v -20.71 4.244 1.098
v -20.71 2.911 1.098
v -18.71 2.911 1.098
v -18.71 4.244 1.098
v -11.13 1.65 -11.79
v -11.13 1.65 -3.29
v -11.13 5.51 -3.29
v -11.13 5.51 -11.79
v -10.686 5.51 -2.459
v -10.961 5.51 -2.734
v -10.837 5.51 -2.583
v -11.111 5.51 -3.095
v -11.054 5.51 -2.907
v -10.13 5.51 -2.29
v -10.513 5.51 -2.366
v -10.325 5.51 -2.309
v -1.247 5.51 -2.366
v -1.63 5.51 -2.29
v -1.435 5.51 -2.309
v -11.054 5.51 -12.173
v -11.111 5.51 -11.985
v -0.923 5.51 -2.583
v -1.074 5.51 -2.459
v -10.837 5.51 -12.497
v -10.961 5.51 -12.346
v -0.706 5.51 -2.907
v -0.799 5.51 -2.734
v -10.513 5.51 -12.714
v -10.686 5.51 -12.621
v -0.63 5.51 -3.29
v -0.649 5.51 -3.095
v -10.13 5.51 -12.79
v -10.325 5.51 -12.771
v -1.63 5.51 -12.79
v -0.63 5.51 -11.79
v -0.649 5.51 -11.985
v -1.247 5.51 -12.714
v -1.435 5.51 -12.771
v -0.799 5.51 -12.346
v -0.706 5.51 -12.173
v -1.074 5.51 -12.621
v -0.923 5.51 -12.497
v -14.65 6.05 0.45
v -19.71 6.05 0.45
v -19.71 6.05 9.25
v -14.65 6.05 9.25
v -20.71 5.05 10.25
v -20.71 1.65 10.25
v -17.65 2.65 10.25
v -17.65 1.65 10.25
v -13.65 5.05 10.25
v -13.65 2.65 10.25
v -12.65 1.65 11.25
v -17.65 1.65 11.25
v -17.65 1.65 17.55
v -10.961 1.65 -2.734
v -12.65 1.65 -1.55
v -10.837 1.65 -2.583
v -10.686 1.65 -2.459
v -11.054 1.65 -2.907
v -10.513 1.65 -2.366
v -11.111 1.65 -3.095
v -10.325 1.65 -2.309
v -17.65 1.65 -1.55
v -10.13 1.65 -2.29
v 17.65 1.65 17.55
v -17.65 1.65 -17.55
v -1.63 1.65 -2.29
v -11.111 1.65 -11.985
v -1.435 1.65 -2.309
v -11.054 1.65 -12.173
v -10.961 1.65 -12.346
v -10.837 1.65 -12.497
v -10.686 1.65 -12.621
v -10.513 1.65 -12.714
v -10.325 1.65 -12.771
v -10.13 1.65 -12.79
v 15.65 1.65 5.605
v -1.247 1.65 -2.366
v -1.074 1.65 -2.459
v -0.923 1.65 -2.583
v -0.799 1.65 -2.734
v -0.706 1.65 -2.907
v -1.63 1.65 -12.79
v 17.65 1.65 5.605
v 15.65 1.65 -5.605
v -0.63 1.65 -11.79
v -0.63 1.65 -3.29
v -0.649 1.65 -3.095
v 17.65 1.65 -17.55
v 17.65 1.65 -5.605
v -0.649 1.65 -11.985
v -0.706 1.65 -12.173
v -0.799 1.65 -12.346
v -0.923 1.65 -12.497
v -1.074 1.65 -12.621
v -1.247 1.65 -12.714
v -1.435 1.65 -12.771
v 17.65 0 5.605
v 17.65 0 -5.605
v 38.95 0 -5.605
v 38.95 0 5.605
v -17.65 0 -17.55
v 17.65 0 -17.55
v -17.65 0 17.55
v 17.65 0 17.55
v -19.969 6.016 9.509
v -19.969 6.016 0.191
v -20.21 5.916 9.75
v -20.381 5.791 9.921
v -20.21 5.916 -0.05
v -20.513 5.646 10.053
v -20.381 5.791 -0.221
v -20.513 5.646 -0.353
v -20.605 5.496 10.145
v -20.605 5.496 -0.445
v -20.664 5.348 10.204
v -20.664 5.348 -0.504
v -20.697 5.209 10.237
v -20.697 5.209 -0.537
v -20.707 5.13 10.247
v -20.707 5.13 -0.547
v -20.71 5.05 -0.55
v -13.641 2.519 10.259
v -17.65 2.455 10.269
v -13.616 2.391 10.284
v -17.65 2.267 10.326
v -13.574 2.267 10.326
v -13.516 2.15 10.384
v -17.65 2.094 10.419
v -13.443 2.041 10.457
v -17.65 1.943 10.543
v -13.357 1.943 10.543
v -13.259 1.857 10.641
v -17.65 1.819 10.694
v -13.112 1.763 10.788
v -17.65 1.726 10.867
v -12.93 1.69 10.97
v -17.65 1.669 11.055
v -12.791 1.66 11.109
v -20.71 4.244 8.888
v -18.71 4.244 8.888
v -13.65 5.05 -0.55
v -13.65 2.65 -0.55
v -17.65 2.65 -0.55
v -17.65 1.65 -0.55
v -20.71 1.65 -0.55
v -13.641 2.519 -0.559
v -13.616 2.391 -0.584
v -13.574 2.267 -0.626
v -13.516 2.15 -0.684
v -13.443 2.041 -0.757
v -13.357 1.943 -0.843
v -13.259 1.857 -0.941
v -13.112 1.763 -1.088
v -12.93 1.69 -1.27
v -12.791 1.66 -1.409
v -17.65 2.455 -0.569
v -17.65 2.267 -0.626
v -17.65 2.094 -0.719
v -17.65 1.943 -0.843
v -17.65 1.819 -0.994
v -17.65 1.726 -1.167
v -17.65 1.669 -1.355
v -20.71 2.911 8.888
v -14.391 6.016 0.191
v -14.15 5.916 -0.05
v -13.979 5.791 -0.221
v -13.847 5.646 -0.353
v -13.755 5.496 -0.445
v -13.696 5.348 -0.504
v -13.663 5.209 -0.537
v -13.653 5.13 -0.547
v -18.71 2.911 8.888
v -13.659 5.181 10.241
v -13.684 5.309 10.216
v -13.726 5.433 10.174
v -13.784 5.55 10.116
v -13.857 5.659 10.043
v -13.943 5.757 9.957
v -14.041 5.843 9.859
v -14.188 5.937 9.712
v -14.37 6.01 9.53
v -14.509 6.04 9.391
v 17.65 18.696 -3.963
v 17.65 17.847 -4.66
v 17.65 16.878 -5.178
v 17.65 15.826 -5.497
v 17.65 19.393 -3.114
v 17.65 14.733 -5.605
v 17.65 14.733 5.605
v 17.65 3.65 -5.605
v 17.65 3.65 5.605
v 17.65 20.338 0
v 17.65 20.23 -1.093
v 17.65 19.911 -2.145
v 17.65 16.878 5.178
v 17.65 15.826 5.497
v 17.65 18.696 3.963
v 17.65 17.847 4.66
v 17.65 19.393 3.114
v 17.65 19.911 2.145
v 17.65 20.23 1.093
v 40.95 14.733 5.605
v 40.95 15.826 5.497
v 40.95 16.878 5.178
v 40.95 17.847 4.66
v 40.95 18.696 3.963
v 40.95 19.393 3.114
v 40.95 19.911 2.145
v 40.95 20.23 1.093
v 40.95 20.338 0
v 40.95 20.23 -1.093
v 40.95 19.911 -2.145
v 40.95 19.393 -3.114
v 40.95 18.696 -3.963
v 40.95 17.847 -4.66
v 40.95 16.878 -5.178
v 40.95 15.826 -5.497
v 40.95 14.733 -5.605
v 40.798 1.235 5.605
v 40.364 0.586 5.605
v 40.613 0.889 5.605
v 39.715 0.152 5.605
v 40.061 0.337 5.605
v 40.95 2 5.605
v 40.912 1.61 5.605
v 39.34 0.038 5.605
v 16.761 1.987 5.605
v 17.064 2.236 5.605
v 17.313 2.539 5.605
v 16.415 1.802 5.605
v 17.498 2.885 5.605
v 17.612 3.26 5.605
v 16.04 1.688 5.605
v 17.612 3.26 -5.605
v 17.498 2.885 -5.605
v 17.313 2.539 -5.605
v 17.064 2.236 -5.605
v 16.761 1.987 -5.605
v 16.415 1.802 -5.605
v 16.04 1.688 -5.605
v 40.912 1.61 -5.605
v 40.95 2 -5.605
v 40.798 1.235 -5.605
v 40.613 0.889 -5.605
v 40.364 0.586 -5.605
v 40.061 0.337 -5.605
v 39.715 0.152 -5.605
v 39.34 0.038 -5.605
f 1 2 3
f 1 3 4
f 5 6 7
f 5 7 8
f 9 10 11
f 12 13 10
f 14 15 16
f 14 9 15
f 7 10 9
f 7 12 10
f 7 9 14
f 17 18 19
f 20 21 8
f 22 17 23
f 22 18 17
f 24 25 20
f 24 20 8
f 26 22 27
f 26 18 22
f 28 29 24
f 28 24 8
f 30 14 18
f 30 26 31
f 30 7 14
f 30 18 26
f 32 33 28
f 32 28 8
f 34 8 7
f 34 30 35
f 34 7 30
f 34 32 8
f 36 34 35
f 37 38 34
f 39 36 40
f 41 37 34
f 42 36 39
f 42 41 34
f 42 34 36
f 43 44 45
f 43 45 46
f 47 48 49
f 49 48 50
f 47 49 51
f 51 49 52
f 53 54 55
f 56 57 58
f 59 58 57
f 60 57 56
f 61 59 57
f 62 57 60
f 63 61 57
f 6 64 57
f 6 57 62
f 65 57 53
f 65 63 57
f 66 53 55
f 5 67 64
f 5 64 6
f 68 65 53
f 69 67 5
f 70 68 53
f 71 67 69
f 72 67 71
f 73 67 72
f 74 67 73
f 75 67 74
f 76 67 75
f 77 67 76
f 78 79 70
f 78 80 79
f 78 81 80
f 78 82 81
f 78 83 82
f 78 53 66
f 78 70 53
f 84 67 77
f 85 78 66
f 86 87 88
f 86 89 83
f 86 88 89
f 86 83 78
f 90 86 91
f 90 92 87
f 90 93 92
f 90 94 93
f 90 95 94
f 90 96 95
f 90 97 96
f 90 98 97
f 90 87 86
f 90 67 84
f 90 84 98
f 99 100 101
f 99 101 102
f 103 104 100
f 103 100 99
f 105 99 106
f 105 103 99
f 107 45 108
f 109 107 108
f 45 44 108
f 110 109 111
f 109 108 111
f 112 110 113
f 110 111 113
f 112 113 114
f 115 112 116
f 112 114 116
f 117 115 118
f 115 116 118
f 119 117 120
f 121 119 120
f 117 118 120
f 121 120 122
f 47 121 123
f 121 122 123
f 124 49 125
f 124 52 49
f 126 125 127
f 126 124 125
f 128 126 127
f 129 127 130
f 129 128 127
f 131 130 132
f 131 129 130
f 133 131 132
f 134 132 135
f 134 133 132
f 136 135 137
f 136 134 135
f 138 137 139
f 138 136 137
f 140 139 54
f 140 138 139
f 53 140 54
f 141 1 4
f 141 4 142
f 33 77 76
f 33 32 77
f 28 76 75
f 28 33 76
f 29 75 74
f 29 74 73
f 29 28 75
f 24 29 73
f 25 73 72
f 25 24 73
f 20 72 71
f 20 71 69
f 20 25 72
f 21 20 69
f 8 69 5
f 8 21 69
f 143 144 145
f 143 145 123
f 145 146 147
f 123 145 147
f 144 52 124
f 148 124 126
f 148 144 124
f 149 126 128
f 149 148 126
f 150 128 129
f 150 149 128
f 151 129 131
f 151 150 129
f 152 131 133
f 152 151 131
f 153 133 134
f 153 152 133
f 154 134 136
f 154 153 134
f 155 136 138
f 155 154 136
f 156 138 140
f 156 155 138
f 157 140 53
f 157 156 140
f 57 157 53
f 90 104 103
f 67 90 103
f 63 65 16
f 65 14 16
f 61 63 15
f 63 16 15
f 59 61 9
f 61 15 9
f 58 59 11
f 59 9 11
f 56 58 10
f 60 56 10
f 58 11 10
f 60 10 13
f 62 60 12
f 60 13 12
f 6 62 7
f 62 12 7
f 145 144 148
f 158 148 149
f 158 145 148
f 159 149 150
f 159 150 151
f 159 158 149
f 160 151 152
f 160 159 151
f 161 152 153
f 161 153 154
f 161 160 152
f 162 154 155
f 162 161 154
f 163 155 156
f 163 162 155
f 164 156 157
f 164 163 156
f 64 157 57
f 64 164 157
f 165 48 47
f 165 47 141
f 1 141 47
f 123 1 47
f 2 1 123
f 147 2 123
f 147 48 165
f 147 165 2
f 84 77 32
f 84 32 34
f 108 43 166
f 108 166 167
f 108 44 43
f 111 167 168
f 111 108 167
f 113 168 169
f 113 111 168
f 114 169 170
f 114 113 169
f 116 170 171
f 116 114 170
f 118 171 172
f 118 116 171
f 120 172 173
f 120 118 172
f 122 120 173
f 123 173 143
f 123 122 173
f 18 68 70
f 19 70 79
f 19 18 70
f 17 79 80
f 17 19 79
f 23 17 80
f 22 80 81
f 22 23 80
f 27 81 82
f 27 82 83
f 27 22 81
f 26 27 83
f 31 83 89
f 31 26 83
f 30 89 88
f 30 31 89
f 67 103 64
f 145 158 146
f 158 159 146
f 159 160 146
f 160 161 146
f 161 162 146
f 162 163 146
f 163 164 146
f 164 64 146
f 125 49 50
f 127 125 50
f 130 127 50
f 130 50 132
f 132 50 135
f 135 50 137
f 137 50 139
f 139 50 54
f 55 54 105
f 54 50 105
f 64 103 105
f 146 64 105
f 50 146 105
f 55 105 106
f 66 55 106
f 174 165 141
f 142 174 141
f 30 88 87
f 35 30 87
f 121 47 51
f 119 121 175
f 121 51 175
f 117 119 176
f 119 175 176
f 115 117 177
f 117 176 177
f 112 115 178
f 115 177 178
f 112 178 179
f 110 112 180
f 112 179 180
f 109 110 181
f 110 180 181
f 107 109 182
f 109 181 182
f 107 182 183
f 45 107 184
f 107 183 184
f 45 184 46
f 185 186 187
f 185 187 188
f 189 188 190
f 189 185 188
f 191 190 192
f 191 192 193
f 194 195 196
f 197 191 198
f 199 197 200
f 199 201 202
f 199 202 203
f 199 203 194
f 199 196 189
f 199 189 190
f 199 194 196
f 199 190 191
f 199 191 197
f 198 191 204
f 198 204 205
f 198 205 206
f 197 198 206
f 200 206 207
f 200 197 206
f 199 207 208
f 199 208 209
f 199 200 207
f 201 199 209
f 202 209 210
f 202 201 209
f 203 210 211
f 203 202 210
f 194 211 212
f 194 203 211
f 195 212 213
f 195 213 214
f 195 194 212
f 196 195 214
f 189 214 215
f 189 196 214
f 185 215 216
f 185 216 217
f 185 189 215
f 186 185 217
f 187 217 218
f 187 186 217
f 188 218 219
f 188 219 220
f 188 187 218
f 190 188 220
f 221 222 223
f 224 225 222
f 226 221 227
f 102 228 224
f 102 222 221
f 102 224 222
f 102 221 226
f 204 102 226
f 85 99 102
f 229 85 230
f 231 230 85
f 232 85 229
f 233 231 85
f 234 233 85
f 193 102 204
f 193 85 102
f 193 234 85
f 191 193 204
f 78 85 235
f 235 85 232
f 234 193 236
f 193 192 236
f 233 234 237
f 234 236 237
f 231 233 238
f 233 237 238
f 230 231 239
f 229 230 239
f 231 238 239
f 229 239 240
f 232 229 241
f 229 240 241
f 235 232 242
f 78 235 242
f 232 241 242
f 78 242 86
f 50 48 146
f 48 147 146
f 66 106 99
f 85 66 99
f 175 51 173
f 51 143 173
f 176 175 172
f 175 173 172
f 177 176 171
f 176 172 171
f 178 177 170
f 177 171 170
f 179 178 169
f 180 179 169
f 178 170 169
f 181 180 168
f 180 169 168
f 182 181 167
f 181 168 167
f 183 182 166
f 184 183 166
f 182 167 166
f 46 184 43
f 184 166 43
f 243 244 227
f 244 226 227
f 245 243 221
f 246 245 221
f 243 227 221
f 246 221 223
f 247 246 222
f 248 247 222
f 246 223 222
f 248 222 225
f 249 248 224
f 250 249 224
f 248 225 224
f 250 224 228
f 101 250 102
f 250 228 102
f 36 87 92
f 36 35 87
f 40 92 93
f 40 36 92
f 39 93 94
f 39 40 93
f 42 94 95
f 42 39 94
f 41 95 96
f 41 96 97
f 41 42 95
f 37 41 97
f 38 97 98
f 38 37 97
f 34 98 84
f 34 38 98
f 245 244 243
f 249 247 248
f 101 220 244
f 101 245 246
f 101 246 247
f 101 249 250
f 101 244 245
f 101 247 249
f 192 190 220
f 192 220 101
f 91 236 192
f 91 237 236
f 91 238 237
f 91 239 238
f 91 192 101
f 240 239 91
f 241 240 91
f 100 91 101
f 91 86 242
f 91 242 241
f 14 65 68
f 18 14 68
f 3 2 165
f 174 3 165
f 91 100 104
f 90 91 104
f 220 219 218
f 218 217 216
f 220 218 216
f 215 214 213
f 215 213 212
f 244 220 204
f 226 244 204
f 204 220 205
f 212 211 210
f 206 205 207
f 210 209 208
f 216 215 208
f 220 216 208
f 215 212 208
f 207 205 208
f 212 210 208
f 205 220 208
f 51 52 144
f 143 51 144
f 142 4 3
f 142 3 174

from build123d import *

# Parameters (mm, degrees)
SKETCH1_W           = 10.5
SKETCH1_H           = 10.5
SKETCH1_W_2         = 4
SKETCH1_H_2         = 10.8
BOSS_EXTRUDE1_DEPTH = 1.65
BOSS_EXTRUDE2_START = 1.65
SKETCH1_3_W         = 4
SKETCH1_3_H         = 10.8
SKETCH1_3_W_2       = 3.06
BOSS_EXTRUDE2_DEPTH = 4.4
BOSS_EXTRUDE3_START = 1.65
SKETCH1_4_W         = 10.5
SKETCH1_4_H         = 10.5
BOSS_EXTRUDE3_DEPTH = 3.86
FILLET1_R           = 1
FILLET2_R           = 1
SKETCH2_W           = 7.790130909
SKETCH2_H           = 1.333210324
CUT_EXTRUDE1_DEPTH  = 2
FILLET3_R           = 1
BOSS_EXTRUDE4_DEPTH = 23.3
FILLET4_R           = 2
FILLET5_R           = 2


with BuildPart() as part:
    # Sketch1 → Boss-Extrude1 (new body)
    with BuildSketch(Plane(origin=(0, 0, 0), x_dir=(1, 0, 0), z_dir=(0, 1, 0))):
        Polygon((17.65, 17.55), (-17.65, 17.55), (-17.65, 0.55), (-13.65, 0.55), (-13.65, -10.25), (-17.65, -10.25), (-17.65, -17.55), (17.65, -17.55), align=None)
        with Locations((-5.88, 7.54)):
            Rectangle(SKETCH1_W, SKETCH1_H, mode=Mode.SUBTRACT)
        with Locations((-15.65, -4.85)):
            Rectangle(SKETCH1_W_2, SKETCH1_H_2)
        with Locations((-5.88, 7.54)):
            Rectangle(SKETCH1_W, SKETCH1_H)
    extrude(amount=BOSS_EXTRUDE1_DEPTH)

    # Sketch1<3> → Boss-Extrude2 (add)
    with BuildSketch(Plane(origin=(0, 0, 0), x_dir=(1, 0, 0), z_dir=(0, 1, 0)).offset(BOSS_EXTRUDE2_START)):
        with Locations((-15.65, -4.85)):
            Rectangle(SKETCH1_3_W, SKETCH1_3_H)
        with Locations((-19.18, -4.85)):
            Rectangle(SKETCH1_3_W_2, SKETCH1_3_H)
    extrude(amount=BOSS_EXTRUDE2_DEPTH)

    # Sketch1<4> → Boss-Extrude3 (add)
    with BuildSketch(Plane(origin=(0, 0, 0), x_dir=(1, 0, 0), z_dir=(0, 1, 0)).offset(BOSS_EXTRUDE3_START)):
        with Locations((-5.88, 7.54)):
            Rectangle(SKETCH1_4_W, SKETCH1_4_H)
    extrude(amount=BOSS_EXTRUDE3_DEPTH)

    # Fillet1
    fillet1_edges = [part.edges().sort_by_distance(p)[0] for p in [
        (-15.65, 1.65, 10.25),
        (-15.65, 1.65, -0.55),
        (-13.65, 1.65, 4.85),
    ]]
    fillet(fillet1_edges, radius=FILLET1_R)

    # Fillet2
    fillet2_edges = [part.edges().sort_by_distance(p)[0] for p in [
        (-17.18, 6.05, -0.55),
        (-20.71, 6.05, 4.85),
        (-17.18, 6.05, 10.25),
        (-13.65, 6.05, 4.85),
    ]]
    fillet(fillet2_edges, radius=FILLET2_R)

    # Sketch2 → Cut-Extrude1 (cut)
    with BuildSketch(Plane.ZY.offset(20.71)):
        with Locations((4.993003368, 3.577240422)):
            Rectangle(SKETCH2_W, SKETCH2_H)
    extrude(amount=-CUT_EXTRUDE1_DEPTH, mode=Mode.SUBTRACT)

    # Fillet3
    fillet3_edges = [part.edges().sort_by_distance(p)[0] for p in [
        (-11.13, 3.58, -2.29),
        (-0.63, 3.58, -2.29),
        (-0.63, 3.58, -12.79),
        (-11.13, 3.58, -12.79),
    ]]
    fillet(fillet3_edges, radius=FILLET3_R)

    # Sketch4 → Boss-Extrude4 (add)
    with BuildSketch(Plane(origin=(17.65, 0, 0), x_dir=(0, 0, -1), z_dir=(1, 0, 0))):
        with BuildLine():
            Line((-5.605, 0), (-5.605, 14.732615083))
            ThreePointArc((-5.605, 14.732615083), (0, 20.337615083), (5.605, 14.732615083))
            Line((5.605, 14.732615083), (5.605, 0))
            Line((5.605, 0), (-5.605, 0))
        make_face()
    extrude(amount=BOSS_EXTRUDE4_DEPTH)

    # Fillet4
    fillet4_edges = [part.edges().sort_by_distance(p)[0] for p in [
        (17.65, 1.65, 0),
    ]]
    fillet(fillet4_edges, radius=FILLET4_R)

    # Fillet5
    fillet5_edges = [part.edges().sort_by_distance(p)[0] for p in [
        (40.95, 0, 0),
    ]]
    fillet(fillet5_edges, radius=FILLET5_R)


solid = part.part
